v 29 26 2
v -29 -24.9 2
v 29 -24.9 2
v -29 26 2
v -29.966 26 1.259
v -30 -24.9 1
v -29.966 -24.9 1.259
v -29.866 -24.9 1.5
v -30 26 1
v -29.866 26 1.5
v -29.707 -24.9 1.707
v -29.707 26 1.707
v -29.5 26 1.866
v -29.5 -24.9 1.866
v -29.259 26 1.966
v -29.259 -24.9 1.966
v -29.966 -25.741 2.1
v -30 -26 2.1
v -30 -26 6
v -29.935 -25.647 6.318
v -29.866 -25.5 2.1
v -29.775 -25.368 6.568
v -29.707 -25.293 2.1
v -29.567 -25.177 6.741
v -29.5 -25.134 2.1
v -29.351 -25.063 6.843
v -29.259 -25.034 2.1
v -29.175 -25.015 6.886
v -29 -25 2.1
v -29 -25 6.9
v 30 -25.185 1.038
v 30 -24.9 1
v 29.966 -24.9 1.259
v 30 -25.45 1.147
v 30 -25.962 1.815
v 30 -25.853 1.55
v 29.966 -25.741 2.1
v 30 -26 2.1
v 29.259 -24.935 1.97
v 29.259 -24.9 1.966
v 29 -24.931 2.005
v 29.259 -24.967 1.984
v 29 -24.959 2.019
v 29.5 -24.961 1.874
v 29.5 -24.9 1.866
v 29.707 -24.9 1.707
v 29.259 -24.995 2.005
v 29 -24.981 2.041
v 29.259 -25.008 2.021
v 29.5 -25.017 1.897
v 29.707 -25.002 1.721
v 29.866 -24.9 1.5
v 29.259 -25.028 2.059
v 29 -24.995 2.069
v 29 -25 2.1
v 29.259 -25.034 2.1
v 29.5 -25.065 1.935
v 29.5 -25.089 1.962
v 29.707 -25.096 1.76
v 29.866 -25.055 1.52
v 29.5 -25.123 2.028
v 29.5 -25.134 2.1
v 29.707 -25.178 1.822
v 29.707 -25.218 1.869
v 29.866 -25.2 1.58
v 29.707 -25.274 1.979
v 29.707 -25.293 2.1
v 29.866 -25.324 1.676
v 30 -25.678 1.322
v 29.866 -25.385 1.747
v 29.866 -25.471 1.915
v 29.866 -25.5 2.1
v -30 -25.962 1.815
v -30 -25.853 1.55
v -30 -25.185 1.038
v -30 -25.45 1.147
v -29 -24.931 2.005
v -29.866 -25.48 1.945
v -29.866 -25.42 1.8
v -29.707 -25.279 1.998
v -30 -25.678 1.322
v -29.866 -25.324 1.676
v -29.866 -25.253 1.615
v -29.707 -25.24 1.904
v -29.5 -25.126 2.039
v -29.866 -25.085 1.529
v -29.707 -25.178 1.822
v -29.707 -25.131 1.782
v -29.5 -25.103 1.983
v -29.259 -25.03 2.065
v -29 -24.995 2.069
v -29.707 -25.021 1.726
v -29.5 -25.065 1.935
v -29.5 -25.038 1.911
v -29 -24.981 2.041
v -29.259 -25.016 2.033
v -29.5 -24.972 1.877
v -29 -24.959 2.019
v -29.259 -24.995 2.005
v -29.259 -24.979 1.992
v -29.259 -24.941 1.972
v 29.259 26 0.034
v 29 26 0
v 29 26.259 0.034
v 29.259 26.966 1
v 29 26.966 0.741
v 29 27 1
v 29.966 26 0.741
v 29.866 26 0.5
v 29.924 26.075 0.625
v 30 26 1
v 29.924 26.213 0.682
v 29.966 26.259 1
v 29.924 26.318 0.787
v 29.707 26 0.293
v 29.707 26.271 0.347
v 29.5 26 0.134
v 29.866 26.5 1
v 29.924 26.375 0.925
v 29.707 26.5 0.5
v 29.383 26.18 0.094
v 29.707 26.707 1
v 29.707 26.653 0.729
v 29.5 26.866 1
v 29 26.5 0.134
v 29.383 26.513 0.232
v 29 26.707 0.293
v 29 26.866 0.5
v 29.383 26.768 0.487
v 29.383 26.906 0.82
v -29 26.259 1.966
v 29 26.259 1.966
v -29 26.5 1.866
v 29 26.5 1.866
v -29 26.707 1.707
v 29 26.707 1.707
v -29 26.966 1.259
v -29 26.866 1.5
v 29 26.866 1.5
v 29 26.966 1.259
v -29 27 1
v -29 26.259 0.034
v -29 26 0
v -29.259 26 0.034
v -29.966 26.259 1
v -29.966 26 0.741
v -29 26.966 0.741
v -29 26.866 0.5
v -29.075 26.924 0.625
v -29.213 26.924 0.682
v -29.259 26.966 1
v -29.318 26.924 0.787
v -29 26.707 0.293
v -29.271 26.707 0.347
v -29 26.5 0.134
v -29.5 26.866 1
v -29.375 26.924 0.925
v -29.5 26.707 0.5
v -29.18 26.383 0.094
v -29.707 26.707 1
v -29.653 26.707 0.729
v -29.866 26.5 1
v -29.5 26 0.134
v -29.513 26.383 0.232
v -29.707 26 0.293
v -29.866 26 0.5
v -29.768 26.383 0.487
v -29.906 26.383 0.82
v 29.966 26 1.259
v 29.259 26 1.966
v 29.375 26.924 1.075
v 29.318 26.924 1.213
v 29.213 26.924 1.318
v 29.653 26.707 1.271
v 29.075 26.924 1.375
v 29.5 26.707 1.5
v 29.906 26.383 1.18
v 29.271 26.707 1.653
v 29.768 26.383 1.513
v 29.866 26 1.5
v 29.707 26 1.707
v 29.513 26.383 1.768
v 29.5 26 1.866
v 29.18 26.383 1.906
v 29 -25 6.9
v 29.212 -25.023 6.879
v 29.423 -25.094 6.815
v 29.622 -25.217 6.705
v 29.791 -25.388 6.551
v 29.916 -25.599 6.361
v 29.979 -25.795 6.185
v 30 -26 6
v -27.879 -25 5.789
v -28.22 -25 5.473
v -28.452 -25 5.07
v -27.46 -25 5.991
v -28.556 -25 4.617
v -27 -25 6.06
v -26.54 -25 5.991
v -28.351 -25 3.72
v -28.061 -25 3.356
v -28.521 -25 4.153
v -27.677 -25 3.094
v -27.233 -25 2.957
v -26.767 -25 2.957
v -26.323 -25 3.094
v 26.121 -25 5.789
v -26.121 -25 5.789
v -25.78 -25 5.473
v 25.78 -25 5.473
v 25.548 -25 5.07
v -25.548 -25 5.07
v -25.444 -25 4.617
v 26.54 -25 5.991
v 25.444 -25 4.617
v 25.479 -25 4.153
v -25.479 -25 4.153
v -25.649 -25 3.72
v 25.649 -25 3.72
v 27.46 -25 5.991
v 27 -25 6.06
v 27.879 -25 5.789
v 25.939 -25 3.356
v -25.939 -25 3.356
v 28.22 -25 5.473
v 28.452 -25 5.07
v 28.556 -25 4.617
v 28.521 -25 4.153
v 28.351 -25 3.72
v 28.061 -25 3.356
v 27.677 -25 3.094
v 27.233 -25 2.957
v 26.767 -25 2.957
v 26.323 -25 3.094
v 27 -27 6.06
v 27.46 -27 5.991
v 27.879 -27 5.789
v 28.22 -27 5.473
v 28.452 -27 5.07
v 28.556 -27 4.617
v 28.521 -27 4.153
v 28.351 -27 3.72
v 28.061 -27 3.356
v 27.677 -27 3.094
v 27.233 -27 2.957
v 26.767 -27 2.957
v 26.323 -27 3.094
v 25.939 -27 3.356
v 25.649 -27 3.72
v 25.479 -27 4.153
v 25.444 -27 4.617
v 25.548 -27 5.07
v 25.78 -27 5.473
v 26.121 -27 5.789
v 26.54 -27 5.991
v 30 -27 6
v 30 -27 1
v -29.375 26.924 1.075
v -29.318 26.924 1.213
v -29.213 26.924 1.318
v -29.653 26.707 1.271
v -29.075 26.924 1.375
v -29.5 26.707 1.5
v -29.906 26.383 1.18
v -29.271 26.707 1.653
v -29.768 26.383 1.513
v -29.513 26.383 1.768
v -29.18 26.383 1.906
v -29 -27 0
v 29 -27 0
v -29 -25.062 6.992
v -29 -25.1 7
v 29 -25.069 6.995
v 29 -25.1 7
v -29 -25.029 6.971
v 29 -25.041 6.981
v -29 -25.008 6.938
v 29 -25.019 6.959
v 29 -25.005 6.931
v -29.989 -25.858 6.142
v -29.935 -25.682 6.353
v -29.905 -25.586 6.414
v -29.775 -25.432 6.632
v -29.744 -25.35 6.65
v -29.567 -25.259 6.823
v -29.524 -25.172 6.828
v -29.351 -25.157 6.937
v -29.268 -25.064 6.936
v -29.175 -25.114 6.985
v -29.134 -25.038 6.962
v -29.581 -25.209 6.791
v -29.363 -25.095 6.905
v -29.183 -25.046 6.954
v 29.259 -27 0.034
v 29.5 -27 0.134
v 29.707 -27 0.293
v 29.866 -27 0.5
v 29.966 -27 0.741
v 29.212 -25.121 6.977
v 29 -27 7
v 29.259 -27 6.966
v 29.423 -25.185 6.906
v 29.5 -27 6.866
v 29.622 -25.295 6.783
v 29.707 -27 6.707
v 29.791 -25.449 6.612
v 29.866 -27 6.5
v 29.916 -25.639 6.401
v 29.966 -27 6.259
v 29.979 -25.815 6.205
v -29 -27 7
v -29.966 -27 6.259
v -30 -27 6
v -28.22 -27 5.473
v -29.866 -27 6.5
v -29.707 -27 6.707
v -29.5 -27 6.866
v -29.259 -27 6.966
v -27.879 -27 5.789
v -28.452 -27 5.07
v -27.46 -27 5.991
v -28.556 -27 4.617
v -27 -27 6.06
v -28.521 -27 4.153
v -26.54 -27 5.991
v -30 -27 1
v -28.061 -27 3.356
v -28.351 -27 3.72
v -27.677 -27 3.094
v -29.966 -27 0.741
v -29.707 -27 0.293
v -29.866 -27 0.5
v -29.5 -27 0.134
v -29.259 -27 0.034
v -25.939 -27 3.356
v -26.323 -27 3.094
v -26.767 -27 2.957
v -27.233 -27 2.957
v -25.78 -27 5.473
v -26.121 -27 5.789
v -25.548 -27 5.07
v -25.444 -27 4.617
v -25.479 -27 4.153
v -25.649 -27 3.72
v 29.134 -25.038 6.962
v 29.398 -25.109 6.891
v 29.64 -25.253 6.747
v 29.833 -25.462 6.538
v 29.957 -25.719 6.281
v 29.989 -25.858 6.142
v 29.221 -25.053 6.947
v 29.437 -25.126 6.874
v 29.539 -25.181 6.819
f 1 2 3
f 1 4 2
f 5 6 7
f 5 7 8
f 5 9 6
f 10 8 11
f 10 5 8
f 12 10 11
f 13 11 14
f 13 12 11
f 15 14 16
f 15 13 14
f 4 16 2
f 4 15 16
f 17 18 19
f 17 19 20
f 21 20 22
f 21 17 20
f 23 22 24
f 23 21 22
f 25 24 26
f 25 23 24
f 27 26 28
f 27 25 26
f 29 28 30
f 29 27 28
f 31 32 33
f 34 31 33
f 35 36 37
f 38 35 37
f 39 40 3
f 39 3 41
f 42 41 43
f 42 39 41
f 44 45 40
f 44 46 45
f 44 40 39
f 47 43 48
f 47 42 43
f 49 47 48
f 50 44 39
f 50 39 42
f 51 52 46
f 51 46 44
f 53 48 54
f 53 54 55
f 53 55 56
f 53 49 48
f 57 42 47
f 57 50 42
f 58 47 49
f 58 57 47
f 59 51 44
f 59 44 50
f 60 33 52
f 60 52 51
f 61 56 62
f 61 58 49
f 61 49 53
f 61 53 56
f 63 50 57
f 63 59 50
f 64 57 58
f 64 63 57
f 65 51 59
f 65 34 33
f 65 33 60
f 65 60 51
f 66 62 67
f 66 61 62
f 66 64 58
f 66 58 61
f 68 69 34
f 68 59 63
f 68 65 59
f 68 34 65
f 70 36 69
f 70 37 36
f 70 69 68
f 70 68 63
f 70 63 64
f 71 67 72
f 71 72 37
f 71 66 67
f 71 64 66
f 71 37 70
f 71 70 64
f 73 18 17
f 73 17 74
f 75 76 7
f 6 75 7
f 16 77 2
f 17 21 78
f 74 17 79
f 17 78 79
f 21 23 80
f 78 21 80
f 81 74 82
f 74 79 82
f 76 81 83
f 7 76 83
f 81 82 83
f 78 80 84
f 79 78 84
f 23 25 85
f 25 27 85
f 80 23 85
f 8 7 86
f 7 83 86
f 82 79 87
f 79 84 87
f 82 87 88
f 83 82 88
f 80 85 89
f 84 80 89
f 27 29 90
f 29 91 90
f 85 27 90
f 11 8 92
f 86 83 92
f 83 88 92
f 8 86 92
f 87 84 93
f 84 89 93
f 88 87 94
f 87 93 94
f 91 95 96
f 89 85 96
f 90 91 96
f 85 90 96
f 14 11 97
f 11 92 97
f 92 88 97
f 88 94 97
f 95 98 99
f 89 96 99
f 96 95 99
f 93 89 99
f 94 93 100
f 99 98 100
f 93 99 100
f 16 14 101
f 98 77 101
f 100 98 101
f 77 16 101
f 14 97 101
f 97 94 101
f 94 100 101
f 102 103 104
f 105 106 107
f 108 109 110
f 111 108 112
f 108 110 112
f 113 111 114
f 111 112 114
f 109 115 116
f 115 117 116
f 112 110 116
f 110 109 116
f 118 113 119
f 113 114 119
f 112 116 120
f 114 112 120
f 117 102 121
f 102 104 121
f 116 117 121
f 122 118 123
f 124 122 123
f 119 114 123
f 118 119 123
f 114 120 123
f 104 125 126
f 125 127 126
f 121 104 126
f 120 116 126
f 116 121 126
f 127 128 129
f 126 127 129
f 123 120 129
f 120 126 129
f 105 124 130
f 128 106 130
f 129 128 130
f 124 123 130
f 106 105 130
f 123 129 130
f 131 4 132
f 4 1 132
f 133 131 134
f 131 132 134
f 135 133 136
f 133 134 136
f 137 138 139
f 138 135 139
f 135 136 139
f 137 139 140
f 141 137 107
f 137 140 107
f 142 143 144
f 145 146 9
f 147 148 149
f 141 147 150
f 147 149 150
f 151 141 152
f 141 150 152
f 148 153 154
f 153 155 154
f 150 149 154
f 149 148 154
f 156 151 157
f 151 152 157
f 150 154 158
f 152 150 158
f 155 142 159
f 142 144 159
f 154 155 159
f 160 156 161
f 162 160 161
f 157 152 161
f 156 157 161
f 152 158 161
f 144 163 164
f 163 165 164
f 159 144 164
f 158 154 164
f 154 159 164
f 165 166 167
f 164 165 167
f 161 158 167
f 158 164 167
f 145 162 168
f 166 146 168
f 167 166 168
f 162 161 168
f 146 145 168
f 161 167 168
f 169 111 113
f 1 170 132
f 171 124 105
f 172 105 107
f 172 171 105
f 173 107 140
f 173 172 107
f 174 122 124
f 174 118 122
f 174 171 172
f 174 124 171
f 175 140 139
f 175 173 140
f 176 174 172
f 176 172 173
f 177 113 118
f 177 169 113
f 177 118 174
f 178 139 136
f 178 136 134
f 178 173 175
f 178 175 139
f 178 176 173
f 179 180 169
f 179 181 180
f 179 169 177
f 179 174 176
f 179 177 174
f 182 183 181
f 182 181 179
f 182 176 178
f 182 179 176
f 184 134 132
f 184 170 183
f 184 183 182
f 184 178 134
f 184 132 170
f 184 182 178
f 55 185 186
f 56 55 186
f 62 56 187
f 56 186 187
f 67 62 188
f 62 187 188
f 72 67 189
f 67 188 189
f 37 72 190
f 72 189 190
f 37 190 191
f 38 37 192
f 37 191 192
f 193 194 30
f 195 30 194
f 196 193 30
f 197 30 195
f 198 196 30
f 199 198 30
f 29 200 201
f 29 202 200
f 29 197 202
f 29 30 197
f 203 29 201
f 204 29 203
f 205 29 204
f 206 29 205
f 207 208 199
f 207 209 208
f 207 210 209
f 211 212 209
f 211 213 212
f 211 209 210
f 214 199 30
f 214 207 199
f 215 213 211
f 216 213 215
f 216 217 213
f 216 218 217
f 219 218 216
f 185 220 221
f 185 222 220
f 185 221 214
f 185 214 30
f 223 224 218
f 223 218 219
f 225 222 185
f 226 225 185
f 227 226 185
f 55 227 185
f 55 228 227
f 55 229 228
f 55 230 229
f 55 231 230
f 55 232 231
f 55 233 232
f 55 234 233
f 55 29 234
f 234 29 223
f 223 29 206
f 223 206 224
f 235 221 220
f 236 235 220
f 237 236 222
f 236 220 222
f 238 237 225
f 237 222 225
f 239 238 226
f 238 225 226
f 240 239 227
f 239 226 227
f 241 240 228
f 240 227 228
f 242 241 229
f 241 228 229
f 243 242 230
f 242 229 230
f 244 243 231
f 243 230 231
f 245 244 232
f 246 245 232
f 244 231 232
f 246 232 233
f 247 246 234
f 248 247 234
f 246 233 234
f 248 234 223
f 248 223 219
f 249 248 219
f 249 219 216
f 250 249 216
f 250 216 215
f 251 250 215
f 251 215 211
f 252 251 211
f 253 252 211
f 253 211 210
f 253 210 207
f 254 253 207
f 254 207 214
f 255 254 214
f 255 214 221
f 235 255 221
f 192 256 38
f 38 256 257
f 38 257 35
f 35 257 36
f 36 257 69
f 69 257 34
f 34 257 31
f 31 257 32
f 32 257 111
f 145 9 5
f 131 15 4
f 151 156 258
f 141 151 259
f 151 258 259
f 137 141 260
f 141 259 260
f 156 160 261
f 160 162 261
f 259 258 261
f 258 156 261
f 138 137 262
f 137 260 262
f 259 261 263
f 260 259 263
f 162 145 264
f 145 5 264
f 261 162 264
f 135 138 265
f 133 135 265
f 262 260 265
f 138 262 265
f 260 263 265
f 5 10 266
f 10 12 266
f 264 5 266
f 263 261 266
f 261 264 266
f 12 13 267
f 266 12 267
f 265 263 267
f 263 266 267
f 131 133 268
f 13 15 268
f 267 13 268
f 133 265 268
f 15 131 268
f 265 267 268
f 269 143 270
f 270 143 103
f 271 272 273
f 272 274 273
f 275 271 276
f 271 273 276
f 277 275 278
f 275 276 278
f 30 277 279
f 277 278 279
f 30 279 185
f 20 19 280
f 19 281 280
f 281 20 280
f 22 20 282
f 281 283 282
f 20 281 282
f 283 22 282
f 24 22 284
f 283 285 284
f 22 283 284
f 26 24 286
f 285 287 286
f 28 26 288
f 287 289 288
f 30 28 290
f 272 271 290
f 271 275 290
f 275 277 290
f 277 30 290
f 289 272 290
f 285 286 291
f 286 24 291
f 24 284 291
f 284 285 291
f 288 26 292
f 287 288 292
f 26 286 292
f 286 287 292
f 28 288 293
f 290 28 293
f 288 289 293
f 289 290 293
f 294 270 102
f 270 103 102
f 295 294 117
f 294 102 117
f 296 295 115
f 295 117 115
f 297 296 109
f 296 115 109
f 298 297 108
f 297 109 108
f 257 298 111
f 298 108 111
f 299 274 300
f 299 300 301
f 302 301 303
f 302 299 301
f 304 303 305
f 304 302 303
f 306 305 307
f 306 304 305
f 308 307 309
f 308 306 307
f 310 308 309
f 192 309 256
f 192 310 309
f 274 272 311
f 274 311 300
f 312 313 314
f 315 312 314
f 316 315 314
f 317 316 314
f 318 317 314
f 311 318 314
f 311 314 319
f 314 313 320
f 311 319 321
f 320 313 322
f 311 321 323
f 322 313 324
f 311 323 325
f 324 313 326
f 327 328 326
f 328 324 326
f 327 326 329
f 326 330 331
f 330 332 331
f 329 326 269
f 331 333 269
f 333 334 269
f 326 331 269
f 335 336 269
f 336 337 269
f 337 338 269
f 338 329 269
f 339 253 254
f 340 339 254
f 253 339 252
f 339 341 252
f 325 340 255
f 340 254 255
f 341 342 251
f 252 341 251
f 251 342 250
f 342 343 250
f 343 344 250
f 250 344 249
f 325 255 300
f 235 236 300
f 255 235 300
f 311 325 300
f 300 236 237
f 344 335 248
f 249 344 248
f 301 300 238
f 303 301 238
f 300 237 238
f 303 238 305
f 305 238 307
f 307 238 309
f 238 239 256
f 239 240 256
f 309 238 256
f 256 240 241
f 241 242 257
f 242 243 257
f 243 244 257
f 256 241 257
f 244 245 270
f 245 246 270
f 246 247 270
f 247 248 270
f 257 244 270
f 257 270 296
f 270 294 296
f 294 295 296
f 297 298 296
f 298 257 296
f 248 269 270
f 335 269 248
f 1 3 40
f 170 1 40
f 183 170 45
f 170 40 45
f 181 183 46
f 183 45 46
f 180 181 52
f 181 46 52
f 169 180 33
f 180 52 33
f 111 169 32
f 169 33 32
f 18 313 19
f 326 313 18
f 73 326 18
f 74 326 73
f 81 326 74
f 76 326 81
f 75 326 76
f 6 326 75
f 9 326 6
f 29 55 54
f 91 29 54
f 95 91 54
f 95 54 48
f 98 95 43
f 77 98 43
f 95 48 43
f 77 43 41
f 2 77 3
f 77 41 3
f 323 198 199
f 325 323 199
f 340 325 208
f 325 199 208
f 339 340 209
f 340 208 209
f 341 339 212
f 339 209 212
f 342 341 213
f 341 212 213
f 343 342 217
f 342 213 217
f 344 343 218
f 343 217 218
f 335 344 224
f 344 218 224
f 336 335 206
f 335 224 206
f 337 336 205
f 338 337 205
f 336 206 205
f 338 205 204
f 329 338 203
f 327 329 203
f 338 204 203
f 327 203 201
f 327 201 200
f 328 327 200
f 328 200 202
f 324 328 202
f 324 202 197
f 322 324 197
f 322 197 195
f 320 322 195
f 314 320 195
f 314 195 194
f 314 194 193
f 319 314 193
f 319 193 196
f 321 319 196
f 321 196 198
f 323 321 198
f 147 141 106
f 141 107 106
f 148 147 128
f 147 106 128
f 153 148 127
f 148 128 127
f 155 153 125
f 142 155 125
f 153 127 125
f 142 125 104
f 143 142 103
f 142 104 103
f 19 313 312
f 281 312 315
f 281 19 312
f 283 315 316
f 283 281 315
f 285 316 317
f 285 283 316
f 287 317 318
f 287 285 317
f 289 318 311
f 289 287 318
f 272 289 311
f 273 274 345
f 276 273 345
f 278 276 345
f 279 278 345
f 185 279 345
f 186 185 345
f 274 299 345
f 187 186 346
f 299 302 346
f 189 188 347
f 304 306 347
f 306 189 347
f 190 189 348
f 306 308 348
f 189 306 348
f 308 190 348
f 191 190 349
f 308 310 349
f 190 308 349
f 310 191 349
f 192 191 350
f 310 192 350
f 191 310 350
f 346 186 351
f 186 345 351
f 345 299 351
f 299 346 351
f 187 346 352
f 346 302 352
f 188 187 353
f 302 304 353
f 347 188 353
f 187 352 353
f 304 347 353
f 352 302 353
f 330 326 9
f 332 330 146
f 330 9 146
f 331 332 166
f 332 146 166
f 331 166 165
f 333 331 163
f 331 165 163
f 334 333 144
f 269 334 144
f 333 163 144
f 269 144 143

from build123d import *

# Parameters (mm, degrees)
SKETCH1_W           = 60
SKETCH1_H           = 54
BOSS_EXTRUDE1_DEPTH = 2
SKETCH2_W           = 60
SKETCH2_H           = 2
BOSS_EXTRUDE2_DEPTH = 5
SKETCH3_R           = 1.56
CUT_EXTRUDE1_DEPTH  = 5
FILLET1_R           = 0.1
FILLET2_R           = 1
FILLET3_R           = 0.1


with BuildPart() as part:
    # Sketch1 → Boss-Extrude1 (new body)
    with BuildSketch(Plane.XY):
        Rectangle(SKETCH1_W, SKETCH1_H)
    extrude(amount=BOSS_EXTRUDE1_DEPTH)

    # Sketch2 → Boss-Extrude2 (add)
    with BuildSketch(Plane.XY.offset(2)):
        with Locations((0, -26)):
            Rectangle(SKETCH2_W, SKETCH2_H)
    extrude(amount=BOSS_EXTRUDE2_DEPTH)

    # Sketch3 → Cut-Extrude1 (cut)
    with BuildSketch(Plane(origin=(0, -25, 0), x_dir=(1, 0, 0), z_dir=(0, 1, 0))):
        with Locations(Location((27, -4.5, 0), (0, 0, 270))):
            Circle(SKETCH3_R)
        with Locations(Location((-27, -4.5, 0), (0, 0, 270))):
            Circle(SKETCH3_R)
    extrude(amount=-CUT_EXTRUDE1_DEPTH, mode=Mode.SUBTRACT)

    # Fillet1
    fillet1_edges = [part.edges().sort_by_distance(p)[0] for p in [
        (0, -25, 2),
    ]]
    fillet(fillet1_edges, radius=FILLET1_R)

    # Fillet2
    fillet2_edges = [part.edges().sort_by_distance(p)[0] for p in [
        (-30, 1.05, 2),
        (-30, -25, 4.55),
        (30, -25, 4.55),
        (-30, -26, 7),
        (30, -26, 7),
        (30, 1.05, 2),
        (-30, -24.970710678, 2.029289322),
        (30, -24.970710678, 2.029289322),
        (-30, 0, 0),
        (0, 27, 0),
        (30, 0, 0),
        (-30, 27, 1),
        (30, 27, 1),
        (0, 27, 2),
    ]]
    fillet(fillet2_edges, radius=FILLET2_R - 0.0001)  # a hair under: the kernel refuses the full size

    # Fillet3
    fillet3_edges = [part.edges().sort_by_distance(p)[0] for p in [
        (0, -25, 7),
        (-29.763319687, -25.353915697, 6.646084303),
        (29.763319687, -25.353915697, 6.646084303),
    ]]
    fillet(fillet3_edges, radius=FILLET3_R)


solid = part.part
